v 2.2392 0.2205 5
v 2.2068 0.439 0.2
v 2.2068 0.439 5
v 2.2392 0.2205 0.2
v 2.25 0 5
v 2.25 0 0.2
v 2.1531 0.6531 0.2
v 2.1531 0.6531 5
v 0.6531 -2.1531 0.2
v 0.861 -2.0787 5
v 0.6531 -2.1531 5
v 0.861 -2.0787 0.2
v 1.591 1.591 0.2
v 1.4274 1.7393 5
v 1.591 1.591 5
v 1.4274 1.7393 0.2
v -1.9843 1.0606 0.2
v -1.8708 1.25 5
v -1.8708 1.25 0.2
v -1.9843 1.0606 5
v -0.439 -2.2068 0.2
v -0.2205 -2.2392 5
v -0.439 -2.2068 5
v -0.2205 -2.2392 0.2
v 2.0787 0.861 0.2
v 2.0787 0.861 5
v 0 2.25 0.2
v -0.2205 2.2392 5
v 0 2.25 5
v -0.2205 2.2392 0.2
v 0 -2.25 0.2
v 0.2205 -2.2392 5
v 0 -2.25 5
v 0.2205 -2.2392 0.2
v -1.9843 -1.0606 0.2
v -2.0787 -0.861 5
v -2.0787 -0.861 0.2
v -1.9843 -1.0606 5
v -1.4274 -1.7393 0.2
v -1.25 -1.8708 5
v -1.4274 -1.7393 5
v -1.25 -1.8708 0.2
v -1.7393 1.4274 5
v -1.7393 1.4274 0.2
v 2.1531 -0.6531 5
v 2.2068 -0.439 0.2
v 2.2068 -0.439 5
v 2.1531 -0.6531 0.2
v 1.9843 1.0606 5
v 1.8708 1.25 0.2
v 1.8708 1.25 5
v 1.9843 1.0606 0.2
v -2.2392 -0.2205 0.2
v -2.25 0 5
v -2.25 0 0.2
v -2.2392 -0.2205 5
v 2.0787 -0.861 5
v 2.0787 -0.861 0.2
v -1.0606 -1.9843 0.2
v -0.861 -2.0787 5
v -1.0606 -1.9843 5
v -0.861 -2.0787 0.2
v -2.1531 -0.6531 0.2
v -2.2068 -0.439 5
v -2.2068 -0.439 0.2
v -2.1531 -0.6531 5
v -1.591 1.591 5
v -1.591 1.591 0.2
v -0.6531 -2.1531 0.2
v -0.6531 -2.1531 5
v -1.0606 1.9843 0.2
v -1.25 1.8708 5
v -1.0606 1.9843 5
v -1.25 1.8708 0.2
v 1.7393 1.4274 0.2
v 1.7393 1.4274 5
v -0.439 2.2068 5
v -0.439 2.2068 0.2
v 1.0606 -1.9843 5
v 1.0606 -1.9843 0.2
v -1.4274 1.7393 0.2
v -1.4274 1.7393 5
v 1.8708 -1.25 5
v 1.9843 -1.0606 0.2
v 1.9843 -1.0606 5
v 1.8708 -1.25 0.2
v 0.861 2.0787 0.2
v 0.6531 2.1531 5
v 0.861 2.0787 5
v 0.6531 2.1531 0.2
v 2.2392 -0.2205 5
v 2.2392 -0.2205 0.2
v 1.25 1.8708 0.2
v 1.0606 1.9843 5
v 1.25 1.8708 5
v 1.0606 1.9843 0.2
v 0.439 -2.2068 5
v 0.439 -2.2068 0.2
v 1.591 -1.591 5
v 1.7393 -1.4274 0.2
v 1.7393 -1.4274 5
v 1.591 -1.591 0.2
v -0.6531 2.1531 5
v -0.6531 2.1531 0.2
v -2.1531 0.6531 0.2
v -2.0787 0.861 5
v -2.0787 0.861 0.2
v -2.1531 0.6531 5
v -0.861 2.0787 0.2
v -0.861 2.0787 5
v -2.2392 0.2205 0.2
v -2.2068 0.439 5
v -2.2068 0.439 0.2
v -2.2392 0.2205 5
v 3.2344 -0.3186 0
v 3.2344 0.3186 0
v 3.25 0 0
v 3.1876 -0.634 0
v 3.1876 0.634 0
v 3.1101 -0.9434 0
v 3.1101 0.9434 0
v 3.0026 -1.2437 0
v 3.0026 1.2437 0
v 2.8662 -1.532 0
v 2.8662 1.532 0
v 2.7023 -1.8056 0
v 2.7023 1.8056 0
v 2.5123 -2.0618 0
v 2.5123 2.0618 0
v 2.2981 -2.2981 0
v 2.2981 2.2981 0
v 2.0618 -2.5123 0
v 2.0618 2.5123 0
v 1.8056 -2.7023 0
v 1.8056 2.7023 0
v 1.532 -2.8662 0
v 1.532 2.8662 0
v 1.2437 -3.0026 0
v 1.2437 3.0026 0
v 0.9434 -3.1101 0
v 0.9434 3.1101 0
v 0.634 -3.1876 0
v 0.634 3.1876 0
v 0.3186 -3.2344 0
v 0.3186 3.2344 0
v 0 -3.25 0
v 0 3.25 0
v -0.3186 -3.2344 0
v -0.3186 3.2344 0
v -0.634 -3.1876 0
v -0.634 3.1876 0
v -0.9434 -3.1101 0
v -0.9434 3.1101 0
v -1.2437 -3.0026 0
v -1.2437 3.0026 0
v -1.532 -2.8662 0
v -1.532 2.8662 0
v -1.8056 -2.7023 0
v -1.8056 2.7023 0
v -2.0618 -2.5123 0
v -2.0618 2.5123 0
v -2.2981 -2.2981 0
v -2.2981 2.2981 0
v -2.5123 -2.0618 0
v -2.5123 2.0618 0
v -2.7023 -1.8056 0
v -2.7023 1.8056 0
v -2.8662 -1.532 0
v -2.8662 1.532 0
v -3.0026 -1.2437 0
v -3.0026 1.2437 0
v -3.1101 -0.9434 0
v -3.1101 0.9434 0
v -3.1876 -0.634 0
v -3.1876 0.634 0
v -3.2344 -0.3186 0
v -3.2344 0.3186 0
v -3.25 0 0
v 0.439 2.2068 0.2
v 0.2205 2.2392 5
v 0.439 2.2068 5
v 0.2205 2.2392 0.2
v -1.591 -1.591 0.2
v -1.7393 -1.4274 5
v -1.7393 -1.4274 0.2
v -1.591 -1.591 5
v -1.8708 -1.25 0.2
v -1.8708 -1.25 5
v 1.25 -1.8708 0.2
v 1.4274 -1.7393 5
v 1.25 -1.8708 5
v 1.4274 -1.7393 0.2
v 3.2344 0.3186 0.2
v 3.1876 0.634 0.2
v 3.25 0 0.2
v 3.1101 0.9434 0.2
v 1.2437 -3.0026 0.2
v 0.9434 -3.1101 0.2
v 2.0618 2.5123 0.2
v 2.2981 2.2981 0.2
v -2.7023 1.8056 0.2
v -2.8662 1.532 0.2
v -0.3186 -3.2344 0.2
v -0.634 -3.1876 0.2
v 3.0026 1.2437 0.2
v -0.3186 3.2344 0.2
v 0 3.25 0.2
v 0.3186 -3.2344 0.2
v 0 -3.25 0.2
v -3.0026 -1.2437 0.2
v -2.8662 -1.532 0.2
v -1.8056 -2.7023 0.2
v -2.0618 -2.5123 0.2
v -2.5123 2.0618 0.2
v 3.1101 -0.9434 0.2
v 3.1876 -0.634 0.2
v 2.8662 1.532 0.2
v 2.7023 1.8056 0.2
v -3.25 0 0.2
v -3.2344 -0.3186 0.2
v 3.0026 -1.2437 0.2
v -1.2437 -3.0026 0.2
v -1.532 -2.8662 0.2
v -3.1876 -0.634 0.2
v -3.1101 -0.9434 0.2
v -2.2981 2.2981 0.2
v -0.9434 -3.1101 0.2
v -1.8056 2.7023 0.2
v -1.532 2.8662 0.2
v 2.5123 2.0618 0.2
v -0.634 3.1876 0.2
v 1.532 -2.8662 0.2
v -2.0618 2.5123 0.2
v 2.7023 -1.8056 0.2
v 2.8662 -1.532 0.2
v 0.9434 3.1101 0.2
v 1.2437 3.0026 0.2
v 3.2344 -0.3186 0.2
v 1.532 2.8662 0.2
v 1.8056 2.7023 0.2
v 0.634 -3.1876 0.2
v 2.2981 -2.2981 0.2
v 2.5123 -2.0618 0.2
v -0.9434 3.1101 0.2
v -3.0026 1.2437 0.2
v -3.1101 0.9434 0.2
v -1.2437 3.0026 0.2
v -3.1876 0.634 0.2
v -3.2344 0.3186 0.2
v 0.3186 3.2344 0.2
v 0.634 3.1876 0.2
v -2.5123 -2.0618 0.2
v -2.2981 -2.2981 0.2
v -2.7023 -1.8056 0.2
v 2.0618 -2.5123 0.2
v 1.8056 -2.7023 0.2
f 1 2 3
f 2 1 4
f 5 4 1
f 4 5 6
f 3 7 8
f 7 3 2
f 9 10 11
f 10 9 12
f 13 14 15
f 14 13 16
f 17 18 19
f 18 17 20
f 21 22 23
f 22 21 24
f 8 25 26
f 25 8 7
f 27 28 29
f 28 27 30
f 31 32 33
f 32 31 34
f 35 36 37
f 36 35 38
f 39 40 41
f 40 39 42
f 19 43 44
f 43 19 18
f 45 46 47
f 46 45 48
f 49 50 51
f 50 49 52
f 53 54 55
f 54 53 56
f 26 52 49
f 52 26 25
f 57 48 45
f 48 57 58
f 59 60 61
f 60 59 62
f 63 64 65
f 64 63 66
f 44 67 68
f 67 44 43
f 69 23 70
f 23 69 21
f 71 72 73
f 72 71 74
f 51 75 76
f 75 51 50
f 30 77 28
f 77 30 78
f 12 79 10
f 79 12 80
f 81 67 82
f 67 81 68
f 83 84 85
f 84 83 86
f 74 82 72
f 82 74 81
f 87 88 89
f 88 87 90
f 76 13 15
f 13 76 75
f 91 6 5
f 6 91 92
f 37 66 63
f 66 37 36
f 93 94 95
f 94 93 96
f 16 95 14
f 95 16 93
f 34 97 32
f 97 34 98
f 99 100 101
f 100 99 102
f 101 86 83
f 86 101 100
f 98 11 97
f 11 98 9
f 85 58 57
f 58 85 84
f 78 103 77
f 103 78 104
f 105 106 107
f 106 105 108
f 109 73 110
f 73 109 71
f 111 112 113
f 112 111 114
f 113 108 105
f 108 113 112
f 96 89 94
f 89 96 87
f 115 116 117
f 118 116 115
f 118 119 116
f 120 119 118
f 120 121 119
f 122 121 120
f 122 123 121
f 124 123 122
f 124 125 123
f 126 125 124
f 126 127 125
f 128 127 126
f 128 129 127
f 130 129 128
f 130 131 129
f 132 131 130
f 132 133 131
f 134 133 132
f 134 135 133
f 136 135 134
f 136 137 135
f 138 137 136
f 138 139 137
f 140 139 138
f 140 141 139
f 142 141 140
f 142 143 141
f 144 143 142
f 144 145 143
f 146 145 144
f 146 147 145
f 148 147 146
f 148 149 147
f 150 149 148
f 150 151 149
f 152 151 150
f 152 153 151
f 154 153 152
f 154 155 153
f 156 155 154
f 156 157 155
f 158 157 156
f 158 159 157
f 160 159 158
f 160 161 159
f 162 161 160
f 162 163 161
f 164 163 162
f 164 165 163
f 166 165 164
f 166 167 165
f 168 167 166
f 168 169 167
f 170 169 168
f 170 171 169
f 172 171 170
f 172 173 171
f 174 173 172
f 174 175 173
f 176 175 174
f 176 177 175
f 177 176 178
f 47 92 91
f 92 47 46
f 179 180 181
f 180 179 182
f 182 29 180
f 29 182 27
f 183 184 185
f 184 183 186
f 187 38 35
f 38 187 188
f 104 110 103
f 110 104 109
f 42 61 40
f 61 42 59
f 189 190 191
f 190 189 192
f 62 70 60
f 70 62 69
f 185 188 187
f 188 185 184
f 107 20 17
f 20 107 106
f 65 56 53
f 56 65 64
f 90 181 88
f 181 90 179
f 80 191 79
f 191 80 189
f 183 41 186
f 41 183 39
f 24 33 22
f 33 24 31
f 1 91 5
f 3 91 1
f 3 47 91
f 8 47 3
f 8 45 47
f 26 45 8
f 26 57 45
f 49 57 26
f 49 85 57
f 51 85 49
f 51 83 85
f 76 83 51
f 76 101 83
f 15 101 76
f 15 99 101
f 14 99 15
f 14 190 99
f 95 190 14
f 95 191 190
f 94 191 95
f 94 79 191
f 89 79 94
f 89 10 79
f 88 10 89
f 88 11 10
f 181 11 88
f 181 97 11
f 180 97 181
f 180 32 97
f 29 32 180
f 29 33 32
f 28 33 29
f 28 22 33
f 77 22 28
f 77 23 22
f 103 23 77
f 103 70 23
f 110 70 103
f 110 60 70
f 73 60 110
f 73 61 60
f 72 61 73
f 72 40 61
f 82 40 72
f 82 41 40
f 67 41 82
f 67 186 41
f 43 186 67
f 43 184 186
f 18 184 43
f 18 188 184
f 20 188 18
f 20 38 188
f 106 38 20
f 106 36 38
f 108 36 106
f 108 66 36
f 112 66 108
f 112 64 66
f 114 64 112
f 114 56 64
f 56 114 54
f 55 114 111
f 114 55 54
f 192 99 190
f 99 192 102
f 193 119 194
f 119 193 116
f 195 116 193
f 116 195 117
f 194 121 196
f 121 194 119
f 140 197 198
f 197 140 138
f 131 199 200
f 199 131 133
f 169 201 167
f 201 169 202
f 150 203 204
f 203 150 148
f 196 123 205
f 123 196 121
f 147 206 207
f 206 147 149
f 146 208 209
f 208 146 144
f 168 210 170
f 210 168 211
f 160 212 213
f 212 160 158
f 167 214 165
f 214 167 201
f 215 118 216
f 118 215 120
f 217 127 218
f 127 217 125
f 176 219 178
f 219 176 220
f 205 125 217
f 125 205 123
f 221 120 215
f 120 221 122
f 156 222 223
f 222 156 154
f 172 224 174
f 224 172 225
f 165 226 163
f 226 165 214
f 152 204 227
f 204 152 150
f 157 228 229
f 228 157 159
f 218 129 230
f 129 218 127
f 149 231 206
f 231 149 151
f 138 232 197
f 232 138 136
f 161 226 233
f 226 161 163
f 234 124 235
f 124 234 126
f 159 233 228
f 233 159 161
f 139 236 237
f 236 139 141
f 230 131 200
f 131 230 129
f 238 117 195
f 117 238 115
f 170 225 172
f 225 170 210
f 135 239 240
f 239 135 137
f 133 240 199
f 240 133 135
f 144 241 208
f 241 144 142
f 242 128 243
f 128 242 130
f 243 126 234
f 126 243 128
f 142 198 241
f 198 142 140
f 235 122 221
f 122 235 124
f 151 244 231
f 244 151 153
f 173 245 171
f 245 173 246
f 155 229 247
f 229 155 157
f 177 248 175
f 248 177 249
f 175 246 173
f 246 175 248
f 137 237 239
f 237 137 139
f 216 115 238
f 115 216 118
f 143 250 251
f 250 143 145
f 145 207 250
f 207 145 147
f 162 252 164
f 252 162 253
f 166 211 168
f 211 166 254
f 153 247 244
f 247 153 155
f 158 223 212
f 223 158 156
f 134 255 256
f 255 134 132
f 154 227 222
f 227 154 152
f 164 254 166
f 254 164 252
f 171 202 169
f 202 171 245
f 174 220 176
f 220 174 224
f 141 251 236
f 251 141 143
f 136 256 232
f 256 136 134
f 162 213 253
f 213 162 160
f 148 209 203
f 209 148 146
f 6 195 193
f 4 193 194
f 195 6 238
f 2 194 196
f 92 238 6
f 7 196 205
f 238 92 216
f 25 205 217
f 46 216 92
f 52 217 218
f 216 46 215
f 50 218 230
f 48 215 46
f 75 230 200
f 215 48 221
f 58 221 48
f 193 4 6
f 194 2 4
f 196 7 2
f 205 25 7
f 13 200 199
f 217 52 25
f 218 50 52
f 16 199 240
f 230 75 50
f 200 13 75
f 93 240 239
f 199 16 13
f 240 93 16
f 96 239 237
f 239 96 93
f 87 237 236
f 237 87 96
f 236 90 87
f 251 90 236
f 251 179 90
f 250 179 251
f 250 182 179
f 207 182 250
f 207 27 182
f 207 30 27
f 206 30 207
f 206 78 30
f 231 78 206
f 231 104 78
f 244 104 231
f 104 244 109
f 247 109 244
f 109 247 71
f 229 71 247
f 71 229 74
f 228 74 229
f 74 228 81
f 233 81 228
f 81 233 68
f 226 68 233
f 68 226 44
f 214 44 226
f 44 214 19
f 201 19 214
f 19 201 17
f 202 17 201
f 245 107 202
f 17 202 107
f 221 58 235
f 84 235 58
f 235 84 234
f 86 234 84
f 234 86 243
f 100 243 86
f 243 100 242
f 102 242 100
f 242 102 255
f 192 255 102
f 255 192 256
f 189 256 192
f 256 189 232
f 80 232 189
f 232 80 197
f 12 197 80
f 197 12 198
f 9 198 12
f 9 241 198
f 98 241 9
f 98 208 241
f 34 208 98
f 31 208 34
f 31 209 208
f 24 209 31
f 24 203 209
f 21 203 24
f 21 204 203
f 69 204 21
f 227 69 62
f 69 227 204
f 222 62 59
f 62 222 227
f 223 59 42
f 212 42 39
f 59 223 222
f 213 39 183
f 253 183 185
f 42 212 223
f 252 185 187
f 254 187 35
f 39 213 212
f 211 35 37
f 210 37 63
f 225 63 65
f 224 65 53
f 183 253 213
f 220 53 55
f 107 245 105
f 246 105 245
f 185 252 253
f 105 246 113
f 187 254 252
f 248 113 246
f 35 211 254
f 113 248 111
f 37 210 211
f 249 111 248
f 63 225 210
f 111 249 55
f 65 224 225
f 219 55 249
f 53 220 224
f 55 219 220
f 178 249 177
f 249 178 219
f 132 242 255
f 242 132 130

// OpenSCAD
$fn=64;

union() {
  cylinder(h=5.0, d=4.5);
  cylinder(h=0.2, d=6.5);
}
